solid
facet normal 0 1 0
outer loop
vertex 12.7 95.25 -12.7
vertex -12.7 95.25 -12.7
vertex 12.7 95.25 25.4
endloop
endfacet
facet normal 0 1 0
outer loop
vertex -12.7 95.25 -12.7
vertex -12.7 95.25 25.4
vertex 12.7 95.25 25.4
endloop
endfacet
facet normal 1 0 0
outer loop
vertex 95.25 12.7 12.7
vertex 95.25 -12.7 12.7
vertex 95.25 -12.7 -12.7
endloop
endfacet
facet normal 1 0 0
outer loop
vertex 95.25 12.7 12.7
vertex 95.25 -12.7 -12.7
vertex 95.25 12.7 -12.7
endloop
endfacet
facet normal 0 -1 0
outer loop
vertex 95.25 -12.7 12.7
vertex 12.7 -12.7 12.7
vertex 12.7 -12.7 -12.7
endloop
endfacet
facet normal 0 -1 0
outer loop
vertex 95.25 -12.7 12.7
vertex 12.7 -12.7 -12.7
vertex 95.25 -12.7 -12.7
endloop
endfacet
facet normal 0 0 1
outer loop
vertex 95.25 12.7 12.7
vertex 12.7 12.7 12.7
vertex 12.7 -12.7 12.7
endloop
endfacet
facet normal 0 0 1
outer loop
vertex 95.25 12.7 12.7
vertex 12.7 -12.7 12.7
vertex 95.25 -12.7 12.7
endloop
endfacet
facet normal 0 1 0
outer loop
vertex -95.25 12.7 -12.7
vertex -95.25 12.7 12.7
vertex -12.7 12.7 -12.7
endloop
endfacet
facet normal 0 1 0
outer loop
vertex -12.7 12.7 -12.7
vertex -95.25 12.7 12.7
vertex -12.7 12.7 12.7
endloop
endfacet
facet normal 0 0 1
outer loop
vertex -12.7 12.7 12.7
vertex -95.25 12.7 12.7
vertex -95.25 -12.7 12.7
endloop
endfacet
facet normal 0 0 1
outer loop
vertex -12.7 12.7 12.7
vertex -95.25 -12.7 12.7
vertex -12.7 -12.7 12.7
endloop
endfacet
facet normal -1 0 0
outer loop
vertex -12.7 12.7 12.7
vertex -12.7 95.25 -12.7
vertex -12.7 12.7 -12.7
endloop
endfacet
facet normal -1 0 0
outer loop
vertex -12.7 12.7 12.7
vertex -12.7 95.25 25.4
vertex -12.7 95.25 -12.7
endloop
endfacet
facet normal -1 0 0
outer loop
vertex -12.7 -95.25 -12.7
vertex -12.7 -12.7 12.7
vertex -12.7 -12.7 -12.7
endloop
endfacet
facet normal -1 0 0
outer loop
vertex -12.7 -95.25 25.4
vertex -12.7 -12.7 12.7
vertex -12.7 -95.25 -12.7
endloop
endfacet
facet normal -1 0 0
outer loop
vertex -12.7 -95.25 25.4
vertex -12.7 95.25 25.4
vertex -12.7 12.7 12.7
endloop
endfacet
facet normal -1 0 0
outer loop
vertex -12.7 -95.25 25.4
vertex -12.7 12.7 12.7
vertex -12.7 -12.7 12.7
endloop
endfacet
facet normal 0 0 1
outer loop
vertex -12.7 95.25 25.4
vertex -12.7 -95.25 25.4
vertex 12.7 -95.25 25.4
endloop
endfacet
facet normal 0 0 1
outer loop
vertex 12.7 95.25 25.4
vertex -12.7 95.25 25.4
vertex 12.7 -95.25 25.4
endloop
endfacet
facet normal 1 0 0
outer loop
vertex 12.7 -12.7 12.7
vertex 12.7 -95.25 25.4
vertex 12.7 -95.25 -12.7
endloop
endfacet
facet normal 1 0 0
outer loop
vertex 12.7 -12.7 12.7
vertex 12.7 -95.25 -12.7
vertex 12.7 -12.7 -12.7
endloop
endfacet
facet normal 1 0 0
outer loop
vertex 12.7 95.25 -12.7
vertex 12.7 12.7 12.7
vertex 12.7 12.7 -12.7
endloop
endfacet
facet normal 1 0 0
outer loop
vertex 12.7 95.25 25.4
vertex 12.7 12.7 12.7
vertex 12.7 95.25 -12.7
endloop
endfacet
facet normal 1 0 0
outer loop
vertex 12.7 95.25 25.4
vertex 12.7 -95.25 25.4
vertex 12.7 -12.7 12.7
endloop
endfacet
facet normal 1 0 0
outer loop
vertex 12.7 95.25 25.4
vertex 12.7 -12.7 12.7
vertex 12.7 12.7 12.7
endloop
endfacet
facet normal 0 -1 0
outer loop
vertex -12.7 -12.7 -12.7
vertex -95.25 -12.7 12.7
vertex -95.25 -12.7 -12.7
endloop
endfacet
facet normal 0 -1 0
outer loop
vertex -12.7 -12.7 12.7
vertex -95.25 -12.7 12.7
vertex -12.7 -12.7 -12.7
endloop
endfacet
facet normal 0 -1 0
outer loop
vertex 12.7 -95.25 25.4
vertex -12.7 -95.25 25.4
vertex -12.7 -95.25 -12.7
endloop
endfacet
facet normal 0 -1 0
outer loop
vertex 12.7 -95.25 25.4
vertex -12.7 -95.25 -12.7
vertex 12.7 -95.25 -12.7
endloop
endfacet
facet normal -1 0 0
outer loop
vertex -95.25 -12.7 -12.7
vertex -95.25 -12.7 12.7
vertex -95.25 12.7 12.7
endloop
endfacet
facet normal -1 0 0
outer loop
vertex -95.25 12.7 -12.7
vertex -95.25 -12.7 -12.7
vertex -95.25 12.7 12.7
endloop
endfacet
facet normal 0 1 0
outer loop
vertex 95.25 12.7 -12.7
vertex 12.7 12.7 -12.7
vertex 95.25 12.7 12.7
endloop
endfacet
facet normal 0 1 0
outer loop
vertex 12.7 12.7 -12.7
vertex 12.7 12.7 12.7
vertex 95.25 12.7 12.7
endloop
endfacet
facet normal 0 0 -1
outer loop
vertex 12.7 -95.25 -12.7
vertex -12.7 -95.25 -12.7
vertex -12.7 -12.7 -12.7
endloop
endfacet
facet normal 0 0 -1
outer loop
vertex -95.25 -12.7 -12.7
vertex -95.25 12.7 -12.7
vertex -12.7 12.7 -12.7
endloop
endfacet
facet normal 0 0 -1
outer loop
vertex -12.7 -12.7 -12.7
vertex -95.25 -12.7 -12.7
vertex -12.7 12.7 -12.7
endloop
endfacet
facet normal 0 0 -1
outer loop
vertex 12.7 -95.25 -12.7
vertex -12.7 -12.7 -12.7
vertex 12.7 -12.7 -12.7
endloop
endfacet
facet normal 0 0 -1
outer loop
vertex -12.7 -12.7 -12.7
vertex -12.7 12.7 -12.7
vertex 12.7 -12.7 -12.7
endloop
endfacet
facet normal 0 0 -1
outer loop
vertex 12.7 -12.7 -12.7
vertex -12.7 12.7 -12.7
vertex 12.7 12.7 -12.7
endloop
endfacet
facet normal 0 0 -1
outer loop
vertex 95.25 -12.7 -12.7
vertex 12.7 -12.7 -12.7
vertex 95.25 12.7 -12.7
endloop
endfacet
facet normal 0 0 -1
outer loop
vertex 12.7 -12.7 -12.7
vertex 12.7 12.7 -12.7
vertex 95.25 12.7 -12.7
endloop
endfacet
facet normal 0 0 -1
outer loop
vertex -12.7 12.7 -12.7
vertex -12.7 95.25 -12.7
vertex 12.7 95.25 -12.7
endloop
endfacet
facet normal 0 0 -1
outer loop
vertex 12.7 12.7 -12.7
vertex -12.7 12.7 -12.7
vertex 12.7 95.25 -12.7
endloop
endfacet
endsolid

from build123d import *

# Parameters (mm, degrees)
F0_W     = 25.4
F0_H     = 82.55
F0_H_2   = 25.4
F1_DEPTH = 25.4
F0_W_2   = 82.55
F2_DEPTH = 12.7


with BuildPart() as f1:
    # F0 (on Top) → F1 (new body)
    with BuildSketch(Plane.XY):
        with Locations((0, 53.975)):
            Rectangle(F0_W, F0_H)
        Rectangle(F0_W, F0_H_2)
        with Locations((0, -53.975)):
            Rectangle(F0_W, F0_H)
    extrude(amount=F1_DEPTH)

    # F0 (on Top) → F2 (join, symmetric)
    with BuildSketch(Plane.XY):
        with Locations((0, 53.975)):
            Rectangle(F0_W, F0_H)
        Rectangle(F0_W, F0_H_2)
        with Locations((-53.975, 0)):
            Rectangle(F0_W_2, F0_H_2)
        with Locations((53.975, 0)):
            Rectangle(F0_W_2, F0_H_2)
        with Locations((0, -53.975)):
            Rectangle(F0_W, F0_H)
    extrude(amount=F2_DEPTH, both=True)


solid = f1.part
